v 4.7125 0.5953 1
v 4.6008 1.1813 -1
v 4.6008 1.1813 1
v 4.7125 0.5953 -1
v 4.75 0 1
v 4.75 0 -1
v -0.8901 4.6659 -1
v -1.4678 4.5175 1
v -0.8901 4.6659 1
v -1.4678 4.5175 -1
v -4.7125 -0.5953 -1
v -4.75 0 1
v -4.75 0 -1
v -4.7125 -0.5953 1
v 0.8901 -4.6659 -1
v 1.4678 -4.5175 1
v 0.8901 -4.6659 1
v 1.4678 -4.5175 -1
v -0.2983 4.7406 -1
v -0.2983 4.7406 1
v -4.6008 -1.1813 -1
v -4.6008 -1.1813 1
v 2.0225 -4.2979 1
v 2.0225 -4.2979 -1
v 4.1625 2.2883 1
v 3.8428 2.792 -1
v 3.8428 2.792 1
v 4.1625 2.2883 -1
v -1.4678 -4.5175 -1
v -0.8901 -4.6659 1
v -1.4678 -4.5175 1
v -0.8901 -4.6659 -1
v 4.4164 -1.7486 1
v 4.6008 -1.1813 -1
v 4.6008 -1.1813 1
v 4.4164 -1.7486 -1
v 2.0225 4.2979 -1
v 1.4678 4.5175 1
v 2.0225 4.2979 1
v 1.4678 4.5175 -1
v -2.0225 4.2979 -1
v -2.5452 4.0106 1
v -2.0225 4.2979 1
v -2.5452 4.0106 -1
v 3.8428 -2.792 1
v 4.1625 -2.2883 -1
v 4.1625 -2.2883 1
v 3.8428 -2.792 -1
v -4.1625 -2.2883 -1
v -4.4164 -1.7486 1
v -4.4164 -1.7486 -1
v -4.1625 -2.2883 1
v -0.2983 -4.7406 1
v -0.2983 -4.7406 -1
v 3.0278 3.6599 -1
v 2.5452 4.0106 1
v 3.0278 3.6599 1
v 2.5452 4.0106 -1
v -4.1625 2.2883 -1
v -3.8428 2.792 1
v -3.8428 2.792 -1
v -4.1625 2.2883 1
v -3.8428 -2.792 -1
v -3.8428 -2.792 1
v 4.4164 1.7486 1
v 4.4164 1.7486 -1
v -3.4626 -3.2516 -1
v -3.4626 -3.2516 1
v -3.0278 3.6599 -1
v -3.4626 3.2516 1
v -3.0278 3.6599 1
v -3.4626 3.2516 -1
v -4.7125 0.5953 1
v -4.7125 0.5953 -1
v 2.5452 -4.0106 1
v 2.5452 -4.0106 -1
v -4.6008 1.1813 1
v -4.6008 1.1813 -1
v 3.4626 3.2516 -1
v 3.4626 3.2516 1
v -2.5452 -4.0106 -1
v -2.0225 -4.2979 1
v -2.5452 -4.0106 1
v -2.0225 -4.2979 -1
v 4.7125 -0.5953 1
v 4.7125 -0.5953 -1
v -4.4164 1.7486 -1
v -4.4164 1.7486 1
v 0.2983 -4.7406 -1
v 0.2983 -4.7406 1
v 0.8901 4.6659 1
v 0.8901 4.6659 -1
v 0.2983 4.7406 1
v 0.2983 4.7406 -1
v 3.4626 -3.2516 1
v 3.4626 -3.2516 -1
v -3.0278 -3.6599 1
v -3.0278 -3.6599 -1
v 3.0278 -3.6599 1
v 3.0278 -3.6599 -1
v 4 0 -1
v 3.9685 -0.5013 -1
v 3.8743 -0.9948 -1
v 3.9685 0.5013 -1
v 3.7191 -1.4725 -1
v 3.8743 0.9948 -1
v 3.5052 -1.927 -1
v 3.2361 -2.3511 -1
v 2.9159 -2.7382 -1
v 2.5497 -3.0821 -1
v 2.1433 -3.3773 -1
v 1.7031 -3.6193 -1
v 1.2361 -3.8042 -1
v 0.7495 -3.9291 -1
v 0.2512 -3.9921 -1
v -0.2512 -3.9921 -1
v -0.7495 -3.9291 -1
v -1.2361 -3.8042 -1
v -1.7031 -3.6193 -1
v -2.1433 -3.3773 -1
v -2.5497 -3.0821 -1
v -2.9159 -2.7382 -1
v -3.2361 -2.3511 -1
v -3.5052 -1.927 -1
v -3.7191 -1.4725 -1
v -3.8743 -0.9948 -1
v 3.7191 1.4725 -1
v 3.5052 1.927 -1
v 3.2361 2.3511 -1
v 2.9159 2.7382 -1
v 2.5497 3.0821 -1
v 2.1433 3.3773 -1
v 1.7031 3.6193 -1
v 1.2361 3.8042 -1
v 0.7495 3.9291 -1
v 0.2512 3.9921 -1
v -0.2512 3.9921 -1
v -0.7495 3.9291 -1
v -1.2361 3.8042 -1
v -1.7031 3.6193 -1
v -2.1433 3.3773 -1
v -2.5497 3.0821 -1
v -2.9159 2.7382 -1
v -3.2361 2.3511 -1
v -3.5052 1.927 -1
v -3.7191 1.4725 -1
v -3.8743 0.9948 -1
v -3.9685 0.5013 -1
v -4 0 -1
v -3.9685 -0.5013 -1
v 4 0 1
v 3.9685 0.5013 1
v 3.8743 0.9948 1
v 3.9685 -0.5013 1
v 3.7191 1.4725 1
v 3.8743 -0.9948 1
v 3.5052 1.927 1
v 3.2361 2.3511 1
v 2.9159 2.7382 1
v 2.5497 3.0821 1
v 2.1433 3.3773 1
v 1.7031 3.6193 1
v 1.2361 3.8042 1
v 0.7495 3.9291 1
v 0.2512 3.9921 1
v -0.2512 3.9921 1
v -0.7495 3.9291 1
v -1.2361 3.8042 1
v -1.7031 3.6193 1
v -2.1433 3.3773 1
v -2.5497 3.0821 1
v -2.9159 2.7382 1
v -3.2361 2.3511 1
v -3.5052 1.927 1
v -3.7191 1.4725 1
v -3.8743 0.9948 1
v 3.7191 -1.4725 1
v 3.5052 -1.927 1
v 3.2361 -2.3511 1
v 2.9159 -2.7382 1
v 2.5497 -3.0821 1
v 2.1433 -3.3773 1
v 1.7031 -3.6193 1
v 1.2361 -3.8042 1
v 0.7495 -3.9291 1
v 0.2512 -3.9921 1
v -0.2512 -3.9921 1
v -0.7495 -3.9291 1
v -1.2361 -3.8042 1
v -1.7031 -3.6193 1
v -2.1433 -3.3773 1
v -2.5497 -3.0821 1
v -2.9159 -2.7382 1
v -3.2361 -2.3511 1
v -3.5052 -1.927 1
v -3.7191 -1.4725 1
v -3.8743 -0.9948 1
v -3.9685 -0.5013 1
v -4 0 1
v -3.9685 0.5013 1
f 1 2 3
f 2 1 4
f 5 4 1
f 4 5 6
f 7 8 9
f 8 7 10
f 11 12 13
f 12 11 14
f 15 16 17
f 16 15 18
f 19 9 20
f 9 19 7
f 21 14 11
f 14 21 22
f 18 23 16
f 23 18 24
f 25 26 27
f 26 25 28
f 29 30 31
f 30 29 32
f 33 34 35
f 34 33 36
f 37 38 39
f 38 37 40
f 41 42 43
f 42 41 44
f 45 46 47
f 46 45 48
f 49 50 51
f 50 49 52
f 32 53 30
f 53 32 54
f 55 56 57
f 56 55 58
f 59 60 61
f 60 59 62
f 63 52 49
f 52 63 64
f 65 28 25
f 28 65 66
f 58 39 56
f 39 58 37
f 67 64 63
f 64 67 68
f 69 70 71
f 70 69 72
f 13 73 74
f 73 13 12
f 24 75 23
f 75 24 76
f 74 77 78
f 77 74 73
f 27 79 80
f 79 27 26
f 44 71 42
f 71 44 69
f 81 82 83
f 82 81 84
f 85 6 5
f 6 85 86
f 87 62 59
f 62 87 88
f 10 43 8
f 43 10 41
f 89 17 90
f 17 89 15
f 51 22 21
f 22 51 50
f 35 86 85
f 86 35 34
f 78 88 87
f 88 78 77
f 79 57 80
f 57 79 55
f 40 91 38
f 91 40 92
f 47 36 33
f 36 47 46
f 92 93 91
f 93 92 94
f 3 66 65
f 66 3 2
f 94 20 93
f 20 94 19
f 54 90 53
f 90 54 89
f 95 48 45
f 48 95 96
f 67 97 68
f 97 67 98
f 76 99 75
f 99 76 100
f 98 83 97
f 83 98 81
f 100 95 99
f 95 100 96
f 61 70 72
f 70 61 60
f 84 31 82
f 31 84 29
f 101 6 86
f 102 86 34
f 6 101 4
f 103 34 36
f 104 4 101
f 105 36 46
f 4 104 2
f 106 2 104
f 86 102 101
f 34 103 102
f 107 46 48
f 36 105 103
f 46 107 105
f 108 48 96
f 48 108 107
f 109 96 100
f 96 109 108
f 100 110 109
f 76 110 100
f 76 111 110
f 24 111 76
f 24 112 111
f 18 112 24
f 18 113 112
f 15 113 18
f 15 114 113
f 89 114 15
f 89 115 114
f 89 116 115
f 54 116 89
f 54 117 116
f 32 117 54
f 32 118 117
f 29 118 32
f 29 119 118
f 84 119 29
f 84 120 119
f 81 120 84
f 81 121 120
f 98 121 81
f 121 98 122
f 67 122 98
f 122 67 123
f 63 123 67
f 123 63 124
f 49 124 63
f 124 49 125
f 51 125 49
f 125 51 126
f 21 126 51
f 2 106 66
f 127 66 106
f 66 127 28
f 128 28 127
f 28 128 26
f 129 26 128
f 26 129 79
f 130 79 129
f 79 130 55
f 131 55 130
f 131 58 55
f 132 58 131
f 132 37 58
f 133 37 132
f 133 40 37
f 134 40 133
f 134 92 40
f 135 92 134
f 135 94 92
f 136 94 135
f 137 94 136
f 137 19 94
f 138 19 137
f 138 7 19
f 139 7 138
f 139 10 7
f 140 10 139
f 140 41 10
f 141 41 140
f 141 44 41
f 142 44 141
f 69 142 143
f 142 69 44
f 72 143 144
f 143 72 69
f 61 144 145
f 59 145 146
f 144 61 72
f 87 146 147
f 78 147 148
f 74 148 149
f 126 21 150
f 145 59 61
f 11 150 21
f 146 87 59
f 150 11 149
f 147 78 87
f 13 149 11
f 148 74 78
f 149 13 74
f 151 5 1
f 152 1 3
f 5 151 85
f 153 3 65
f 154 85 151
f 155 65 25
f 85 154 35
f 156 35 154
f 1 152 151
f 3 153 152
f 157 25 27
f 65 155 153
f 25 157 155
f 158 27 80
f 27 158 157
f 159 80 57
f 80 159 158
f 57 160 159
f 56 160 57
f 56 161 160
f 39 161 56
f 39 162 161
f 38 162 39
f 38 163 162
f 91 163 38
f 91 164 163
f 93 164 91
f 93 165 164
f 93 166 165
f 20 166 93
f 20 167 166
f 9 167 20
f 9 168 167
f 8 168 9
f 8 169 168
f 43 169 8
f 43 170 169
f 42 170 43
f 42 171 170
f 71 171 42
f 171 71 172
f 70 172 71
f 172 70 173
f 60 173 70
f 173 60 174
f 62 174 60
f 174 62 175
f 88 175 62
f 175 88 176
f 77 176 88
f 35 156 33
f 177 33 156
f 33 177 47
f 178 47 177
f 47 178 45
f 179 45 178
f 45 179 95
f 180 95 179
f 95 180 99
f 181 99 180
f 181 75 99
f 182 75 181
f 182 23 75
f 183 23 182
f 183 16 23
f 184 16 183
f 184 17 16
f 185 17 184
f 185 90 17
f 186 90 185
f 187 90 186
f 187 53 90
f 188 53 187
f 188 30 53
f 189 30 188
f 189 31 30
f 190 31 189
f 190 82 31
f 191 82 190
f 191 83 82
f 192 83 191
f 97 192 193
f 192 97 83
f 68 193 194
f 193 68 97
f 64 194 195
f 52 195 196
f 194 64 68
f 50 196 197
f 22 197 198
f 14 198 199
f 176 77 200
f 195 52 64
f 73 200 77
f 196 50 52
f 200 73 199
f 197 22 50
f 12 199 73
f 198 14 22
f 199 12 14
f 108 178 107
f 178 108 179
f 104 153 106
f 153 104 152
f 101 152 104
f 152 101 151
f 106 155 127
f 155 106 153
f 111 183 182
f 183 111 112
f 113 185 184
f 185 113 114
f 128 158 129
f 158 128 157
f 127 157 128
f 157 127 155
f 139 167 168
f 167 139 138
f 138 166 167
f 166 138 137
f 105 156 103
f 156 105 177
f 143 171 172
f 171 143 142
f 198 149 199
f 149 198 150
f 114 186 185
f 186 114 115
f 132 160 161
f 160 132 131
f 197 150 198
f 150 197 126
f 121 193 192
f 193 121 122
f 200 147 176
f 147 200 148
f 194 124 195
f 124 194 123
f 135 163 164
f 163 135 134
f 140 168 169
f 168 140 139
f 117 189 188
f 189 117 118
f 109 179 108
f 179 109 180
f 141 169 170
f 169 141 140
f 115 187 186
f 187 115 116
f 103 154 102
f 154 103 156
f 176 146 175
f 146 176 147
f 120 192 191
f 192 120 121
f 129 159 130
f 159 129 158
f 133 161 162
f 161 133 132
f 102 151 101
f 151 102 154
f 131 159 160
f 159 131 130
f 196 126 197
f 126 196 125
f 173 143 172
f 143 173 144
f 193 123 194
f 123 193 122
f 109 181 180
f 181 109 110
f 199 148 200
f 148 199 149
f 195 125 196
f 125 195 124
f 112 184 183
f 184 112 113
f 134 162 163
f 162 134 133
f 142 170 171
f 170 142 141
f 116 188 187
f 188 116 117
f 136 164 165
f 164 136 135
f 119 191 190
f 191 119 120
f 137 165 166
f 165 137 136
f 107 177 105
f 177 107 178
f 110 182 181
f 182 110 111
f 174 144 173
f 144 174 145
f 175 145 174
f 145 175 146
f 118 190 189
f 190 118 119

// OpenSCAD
$fn = 50;


difference() {
	union() {
		translate(v = [0, 0, -1.0000000000]) {
			cylinder(h = 2, r = 4.7500000000);
		}
	}
	union() {
		translate(v = [0, 0, -100.0000000000]) {
			cylinder(h = 200, r = 4.0000000000);
		}
	}
}
